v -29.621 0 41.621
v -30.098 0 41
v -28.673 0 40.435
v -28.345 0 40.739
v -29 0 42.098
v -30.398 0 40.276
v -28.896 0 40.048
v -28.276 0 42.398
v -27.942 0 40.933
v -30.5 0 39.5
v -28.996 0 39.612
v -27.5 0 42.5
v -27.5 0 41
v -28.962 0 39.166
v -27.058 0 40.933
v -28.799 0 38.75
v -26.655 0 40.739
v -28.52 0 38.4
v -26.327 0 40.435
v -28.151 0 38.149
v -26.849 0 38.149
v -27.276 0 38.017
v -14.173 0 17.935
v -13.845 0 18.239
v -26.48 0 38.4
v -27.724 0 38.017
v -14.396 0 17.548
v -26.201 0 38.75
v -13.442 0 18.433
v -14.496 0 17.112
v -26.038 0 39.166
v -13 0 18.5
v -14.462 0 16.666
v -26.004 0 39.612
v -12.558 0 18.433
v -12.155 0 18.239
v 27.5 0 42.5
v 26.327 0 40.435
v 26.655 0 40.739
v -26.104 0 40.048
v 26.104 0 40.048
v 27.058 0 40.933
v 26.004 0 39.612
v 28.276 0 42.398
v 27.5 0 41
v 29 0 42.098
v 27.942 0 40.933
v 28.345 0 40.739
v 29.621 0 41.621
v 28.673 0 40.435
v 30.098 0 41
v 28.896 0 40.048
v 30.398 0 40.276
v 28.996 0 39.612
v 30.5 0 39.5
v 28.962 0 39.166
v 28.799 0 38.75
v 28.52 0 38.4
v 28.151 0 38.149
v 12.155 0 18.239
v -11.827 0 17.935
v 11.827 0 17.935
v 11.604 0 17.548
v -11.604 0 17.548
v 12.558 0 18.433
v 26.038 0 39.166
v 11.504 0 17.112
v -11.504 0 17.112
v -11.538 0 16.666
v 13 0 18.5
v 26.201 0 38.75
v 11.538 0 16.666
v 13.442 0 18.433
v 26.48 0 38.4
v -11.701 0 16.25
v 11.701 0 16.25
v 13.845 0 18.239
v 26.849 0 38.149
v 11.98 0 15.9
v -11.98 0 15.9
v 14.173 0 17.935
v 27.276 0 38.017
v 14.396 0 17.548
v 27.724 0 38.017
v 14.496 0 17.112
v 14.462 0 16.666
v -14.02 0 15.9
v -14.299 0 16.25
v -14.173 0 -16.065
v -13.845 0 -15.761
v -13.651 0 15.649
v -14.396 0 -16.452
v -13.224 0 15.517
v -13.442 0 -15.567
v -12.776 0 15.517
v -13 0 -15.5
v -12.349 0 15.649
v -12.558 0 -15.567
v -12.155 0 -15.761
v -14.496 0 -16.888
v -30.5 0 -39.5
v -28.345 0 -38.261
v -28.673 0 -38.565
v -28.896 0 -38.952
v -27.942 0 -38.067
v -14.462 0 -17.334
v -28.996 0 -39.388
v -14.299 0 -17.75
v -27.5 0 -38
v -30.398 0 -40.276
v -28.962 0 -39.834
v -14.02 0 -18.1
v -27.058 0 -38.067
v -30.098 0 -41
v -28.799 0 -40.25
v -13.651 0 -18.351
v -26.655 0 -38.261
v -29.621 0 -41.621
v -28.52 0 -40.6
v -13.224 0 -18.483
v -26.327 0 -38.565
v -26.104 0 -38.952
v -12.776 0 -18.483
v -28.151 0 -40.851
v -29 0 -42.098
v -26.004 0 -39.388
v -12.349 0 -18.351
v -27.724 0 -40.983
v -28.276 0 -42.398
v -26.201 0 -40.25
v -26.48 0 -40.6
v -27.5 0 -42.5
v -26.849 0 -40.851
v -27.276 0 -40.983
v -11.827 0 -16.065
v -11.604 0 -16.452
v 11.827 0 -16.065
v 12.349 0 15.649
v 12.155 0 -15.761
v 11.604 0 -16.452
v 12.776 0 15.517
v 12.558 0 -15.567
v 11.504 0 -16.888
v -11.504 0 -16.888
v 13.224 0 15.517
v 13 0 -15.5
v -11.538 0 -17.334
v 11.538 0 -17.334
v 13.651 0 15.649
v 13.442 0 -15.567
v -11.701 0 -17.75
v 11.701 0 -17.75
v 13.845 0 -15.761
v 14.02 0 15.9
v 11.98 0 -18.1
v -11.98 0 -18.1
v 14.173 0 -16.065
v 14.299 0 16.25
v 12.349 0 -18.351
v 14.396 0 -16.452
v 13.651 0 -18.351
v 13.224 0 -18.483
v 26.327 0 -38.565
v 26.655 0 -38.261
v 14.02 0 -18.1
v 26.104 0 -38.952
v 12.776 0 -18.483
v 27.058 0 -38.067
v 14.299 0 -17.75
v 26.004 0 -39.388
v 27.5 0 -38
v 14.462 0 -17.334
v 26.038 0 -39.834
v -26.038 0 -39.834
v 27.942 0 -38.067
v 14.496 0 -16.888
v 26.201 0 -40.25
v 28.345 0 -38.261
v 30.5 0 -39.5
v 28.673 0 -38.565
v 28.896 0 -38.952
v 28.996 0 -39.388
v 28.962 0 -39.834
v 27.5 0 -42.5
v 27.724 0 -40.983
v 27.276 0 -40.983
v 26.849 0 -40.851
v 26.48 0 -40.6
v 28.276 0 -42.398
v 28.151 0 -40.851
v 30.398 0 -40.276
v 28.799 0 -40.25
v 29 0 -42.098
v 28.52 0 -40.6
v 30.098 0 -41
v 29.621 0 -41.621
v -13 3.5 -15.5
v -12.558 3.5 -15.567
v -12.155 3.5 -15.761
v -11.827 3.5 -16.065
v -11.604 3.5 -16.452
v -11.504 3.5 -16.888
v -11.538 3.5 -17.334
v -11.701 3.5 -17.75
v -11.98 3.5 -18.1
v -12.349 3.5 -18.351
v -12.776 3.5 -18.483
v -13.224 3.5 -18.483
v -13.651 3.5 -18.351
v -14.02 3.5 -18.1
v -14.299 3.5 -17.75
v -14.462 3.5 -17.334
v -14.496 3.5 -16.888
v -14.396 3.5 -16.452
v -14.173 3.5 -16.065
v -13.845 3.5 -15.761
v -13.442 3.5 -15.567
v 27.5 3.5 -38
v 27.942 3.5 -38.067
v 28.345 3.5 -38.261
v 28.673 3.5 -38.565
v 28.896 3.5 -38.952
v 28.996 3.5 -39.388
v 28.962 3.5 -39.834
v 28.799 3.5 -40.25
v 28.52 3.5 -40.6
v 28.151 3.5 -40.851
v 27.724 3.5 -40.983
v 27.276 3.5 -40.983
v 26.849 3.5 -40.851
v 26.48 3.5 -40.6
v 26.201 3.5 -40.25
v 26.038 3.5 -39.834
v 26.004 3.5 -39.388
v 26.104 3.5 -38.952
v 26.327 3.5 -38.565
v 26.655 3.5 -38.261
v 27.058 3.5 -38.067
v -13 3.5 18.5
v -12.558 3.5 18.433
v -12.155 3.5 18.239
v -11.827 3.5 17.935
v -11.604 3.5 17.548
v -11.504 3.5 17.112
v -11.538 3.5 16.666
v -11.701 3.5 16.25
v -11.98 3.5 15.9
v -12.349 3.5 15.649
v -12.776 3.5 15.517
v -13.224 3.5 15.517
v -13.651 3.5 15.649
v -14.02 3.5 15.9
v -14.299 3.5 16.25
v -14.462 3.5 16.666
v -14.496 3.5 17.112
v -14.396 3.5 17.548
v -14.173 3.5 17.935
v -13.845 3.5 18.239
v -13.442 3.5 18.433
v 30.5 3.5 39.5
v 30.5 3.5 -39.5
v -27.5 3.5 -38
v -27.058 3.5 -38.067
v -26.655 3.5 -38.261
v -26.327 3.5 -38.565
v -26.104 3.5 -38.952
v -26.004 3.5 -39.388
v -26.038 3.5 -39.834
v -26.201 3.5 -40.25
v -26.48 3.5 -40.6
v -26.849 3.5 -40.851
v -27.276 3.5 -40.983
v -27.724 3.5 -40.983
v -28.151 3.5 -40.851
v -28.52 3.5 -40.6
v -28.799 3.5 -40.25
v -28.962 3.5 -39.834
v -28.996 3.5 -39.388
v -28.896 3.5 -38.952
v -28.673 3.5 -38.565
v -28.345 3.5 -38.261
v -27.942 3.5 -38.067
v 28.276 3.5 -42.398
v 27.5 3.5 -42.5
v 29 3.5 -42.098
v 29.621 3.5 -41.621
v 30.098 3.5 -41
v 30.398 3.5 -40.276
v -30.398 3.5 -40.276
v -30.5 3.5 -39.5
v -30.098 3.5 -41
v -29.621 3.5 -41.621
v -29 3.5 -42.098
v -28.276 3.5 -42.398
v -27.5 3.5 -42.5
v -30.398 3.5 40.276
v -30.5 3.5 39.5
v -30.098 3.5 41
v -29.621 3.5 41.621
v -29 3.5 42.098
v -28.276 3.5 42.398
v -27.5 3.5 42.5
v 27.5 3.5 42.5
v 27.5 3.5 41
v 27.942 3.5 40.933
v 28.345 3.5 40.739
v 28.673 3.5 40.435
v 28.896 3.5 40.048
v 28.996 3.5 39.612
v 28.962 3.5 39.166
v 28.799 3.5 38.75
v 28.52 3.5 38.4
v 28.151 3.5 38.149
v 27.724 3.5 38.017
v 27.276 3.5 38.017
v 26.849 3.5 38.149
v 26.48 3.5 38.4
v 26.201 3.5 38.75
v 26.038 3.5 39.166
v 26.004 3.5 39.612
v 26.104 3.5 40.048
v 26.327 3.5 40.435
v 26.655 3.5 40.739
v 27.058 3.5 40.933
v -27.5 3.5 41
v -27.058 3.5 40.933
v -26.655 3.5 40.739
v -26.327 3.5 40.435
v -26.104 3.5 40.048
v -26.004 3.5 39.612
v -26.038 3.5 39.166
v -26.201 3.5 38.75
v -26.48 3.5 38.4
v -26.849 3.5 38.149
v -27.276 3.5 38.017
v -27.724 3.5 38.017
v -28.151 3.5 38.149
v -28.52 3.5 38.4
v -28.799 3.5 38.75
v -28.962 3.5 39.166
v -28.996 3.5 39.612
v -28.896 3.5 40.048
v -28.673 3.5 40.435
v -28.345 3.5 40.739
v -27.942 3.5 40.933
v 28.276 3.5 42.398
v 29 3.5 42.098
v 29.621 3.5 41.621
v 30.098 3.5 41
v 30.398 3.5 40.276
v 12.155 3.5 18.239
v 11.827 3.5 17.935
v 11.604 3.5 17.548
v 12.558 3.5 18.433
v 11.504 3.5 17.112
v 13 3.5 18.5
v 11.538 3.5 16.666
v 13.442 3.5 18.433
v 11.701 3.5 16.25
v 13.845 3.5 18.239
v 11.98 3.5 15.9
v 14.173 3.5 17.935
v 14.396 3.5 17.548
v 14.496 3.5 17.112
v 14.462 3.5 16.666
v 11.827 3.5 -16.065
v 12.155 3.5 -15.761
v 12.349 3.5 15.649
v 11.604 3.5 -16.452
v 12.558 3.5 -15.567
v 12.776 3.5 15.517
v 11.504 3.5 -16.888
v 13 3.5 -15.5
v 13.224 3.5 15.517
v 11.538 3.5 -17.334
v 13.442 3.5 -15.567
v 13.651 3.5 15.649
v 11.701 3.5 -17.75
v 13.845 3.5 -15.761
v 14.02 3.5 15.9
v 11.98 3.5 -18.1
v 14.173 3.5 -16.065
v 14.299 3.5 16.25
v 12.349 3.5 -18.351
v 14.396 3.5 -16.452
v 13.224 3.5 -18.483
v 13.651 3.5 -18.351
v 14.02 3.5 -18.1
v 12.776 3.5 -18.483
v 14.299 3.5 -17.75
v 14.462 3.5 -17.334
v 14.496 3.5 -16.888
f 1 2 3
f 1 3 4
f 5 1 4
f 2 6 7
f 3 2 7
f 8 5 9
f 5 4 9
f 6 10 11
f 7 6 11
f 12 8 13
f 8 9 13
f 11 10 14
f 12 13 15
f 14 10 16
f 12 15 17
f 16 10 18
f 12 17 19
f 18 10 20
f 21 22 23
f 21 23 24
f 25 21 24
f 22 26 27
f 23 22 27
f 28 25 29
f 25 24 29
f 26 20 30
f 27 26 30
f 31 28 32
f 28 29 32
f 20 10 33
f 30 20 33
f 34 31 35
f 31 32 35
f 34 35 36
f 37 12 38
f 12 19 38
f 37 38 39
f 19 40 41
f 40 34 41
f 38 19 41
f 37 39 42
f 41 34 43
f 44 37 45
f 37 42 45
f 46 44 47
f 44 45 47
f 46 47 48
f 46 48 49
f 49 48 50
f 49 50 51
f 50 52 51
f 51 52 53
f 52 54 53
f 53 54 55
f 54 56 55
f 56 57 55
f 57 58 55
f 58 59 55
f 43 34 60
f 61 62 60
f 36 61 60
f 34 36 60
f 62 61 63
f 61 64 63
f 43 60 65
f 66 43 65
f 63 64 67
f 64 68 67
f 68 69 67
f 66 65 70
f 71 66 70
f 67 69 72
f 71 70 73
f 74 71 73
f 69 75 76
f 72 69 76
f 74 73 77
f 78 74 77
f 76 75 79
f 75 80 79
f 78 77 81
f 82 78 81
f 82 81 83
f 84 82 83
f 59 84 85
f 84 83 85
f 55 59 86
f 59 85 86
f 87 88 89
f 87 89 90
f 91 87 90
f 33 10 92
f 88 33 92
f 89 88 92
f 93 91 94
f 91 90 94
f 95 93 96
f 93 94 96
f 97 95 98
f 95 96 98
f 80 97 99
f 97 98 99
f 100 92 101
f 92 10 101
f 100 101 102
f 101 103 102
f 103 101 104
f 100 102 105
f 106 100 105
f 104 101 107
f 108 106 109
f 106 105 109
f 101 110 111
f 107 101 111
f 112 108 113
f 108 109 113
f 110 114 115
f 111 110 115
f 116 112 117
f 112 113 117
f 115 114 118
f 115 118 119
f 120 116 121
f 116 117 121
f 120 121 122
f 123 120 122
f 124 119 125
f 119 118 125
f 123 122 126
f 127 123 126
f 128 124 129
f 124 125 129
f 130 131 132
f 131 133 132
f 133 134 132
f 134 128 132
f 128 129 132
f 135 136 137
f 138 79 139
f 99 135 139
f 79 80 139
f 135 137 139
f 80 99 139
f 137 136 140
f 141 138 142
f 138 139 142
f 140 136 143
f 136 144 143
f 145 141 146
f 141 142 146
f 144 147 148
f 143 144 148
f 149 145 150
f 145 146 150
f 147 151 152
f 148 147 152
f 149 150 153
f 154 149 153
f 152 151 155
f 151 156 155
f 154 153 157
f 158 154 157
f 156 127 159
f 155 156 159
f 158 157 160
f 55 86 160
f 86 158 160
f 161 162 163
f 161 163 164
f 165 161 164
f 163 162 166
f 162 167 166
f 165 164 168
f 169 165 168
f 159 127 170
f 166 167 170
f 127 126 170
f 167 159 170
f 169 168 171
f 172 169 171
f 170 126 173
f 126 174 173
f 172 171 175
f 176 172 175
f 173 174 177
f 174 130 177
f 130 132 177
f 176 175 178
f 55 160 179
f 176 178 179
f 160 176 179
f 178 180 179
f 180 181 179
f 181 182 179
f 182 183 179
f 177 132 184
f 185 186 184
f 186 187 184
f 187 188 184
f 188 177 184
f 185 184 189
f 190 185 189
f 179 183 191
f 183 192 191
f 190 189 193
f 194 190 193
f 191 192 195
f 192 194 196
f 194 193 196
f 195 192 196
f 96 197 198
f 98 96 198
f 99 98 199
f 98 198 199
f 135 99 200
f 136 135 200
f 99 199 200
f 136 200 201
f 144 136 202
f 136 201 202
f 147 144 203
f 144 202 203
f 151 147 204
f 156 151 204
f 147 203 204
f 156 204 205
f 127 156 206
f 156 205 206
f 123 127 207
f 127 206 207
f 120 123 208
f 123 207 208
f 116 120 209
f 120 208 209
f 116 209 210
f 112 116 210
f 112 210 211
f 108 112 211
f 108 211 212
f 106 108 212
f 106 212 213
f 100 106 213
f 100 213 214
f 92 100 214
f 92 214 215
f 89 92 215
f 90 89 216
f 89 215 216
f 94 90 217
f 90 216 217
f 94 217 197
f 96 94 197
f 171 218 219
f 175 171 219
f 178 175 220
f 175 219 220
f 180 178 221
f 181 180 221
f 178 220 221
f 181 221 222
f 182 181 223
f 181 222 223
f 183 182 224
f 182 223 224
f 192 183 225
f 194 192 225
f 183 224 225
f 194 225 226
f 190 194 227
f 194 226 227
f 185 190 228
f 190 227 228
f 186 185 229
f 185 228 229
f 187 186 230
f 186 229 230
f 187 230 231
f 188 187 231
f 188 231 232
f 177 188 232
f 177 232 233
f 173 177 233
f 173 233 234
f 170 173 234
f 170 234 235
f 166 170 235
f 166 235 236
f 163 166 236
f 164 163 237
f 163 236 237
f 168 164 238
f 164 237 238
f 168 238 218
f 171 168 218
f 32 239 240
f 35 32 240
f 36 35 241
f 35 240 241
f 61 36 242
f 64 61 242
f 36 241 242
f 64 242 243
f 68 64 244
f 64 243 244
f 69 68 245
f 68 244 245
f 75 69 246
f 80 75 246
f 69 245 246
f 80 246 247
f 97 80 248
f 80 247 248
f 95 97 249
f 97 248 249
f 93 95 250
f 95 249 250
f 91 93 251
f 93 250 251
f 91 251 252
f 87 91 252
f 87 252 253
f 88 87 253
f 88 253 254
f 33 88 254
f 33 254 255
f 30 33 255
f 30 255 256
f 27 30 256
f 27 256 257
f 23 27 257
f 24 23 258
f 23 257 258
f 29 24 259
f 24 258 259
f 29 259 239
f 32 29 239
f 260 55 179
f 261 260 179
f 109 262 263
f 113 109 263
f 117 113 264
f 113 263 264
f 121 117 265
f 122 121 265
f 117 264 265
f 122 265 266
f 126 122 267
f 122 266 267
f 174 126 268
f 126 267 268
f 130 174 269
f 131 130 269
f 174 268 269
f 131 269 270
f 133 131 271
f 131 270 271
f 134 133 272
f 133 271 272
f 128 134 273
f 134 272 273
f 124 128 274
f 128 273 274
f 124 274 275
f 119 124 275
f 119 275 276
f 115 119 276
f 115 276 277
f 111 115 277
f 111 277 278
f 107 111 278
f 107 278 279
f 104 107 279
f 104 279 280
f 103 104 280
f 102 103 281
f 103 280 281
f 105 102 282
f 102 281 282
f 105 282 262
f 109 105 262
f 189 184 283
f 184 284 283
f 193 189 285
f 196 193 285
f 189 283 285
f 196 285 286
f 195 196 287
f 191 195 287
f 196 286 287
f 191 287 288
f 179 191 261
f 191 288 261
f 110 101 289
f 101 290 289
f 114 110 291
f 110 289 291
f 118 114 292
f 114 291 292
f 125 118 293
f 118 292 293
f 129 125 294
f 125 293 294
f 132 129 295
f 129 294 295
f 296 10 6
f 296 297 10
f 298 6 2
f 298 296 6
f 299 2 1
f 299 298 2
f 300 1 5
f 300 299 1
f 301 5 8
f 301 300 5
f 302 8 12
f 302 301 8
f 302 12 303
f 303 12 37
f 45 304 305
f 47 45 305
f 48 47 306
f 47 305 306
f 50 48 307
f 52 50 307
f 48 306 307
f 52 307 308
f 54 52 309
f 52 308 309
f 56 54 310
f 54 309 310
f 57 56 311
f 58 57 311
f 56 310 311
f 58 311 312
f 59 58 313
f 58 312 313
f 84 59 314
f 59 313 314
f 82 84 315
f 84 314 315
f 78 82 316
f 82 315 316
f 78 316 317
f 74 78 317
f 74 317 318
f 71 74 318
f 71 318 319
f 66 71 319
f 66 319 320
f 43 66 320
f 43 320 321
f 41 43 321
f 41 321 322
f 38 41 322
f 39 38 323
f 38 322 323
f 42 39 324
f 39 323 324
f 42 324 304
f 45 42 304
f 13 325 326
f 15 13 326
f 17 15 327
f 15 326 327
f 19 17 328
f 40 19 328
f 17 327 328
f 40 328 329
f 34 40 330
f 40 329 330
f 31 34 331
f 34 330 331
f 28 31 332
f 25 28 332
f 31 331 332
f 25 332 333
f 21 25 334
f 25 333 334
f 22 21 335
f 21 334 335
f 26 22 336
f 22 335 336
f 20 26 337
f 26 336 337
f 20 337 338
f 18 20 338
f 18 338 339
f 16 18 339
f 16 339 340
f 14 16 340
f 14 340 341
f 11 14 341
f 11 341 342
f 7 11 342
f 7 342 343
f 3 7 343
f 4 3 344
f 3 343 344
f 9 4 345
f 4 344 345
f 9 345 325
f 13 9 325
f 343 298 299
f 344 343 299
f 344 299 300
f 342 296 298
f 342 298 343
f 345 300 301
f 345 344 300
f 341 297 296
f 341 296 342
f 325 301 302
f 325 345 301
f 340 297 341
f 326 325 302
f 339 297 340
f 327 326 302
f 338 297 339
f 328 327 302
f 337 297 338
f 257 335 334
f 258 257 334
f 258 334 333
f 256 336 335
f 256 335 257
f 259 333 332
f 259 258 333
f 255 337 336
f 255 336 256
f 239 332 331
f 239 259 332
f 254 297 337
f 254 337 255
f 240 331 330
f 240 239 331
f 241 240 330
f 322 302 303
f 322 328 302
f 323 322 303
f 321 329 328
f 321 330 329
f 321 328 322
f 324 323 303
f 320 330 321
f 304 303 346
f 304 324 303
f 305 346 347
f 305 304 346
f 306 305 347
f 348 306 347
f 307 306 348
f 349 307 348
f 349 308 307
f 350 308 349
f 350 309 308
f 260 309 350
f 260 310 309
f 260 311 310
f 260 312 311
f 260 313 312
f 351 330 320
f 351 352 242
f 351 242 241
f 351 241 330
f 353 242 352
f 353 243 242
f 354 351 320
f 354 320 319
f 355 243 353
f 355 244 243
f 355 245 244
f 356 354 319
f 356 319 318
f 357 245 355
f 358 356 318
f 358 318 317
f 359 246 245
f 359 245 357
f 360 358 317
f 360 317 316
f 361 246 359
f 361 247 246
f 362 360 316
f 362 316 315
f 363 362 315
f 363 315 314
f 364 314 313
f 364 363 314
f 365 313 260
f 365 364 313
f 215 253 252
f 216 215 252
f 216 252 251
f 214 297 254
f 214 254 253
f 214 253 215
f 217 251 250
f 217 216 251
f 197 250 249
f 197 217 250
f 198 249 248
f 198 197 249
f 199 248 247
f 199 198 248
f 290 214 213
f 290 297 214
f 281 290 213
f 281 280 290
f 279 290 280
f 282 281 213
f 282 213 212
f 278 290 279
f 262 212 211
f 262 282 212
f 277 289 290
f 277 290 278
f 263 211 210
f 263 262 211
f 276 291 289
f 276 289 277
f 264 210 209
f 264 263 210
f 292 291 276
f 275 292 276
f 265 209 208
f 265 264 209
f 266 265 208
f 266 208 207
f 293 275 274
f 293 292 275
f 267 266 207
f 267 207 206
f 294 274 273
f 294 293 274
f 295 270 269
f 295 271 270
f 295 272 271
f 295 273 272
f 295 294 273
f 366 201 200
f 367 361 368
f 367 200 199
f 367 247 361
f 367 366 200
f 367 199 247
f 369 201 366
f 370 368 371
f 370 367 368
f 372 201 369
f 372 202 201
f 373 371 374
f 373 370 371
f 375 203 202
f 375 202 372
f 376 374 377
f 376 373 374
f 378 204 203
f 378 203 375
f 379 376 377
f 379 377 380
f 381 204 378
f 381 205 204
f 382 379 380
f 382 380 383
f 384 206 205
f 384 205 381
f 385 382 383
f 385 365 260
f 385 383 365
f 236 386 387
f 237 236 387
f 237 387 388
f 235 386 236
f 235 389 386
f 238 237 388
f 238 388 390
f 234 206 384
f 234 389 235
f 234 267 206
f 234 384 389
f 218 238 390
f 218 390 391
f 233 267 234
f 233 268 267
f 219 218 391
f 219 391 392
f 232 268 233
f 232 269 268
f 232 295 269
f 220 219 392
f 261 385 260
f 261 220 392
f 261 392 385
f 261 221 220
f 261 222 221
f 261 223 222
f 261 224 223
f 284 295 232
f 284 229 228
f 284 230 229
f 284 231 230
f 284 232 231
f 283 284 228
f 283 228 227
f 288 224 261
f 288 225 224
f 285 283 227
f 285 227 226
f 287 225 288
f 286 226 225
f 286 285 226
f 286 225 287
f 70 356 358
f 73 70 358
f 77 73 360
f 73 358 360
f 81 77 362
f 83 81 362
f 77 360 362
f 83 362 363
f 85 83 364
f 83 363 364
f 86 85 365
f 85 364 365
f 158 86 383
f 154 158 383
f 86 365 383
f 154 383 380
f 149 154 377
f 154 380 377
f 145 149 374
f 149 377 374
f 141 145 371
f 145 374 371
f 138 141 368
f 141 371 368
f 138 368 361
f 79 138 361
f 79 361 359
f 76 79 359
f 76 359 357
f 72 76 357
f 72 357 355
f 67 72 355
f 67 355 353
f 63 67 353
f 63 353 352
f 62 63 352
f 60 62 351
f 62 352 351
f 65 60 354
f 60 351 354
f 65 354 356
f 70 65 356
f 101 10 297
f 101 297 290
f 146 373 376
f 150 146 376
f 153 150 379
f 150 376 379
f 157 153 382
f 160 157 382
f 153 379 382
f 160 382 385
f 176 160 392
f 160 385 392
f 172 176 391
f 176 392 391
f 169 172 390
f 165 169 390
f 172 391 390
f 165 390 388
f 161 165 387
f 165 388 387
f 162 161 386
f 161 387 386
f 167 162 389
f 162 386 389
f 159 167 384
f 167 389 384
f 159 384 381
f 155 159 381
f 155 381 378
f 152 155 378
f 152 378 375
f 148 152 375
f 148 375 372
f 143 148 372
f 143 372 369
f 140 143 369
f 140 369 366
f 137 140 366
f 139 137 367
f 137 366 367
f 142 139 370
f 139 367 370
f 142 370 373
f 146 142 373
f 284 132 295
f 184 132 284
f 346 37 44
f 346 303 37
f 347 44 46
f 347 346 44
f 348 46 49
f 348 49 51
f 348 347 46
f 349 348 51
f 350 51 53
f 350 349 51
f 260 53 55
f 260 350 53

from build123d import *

# Parameters (mm, degrees)
SKETCH1_W           = 61
SKETCH1_H           = 85
BOSS_EXTRUDE1_DEPTH = 3.5
SKETCH2_R           = 1.5
CUT_EXTRUDE1_DEPTH  = 3.5
SKETCH3_R           = 1.5
CUT_EXTRUDE2_DEPTH  = 3.5
FILLET1_R           = 3


with BuildPart() as part:
    # Sketch1 → Boss-Extrude1 (new body)
    with BuildSketch(Plane(origin=(0, 0, 0), x_dir=(1, 0, 0), z_dir=(0, 1, 0))):
        Rectangle(SKETCH1_W, SKETCH1_H)
    extrude(amount=BOSS_EXTRUDE1_DEPTH)

    # Sketch2 → Cut-Extrude1 (cut)
    with BuildSketch(Plane(origin=(0, 3.5, 0), x_dir=(1, 0, 0), z_dir=(0, 1, 0))):
        with Locations(Location((-27.5, 39.5, 0), (0, 0, 270))):
            Circle(SKETCH2_R)
        with Locations(Location((27.5, 39.5, 0), (0, 0, 270))):
            Circle(SKETCH2_R)
        with Locations(Location((-27.5, -39.5, 0), (0, 0, 270))):
            Circle(SKETCH2_R)
        with Locations(Location((27.5, -39.5, 0), (0, 0, 270))):
            Circle(SKETCH2_R)
    extrude(amount=-CUT_EXTRUDE1_DEPTH, mode=Mode.SUBTRACT)

    # Sketch3 → Cut-Extrude2 (cut)
    with BuildSketch(Plane(origin=(0, 3.5, 0), x_dir=(1, 0, 0), z_dir=(0, 1, 0))):
        with Locations(Location((-13, 17, 0), (0, 0, 270))):
            Circle(SKETCH3_R)
        with Locations(Location((13, -17, 0), (0, 0, 270))):
            Circle(SKETCH3_R)
        with Locations(Location((13, 17, 0), (0, 0, 270))):
            Circle(SKETCH3_R)
        with Locations(Location((-13, -17, 0), (0, 0, 270))):
            Circle(SKETCH3_R)
    extrude(amount=-CUT_EXTRUDE2_DEPTH, mode=Mode.SUBTRACT)

    # Fillet1
    fillet1_edges = [part.edges().sort_by_distance(p)[0] for p in [
        (30.5, 1.75, 42.5),
        (-30.5, 1.75, 42.5),
        (-30.5, 1.75, -42.5),
        (30.5, 1.75, -42.5),
    ]]
    fillet(fillet1_edges, radius=FILLET1_R)


solid = part.part
